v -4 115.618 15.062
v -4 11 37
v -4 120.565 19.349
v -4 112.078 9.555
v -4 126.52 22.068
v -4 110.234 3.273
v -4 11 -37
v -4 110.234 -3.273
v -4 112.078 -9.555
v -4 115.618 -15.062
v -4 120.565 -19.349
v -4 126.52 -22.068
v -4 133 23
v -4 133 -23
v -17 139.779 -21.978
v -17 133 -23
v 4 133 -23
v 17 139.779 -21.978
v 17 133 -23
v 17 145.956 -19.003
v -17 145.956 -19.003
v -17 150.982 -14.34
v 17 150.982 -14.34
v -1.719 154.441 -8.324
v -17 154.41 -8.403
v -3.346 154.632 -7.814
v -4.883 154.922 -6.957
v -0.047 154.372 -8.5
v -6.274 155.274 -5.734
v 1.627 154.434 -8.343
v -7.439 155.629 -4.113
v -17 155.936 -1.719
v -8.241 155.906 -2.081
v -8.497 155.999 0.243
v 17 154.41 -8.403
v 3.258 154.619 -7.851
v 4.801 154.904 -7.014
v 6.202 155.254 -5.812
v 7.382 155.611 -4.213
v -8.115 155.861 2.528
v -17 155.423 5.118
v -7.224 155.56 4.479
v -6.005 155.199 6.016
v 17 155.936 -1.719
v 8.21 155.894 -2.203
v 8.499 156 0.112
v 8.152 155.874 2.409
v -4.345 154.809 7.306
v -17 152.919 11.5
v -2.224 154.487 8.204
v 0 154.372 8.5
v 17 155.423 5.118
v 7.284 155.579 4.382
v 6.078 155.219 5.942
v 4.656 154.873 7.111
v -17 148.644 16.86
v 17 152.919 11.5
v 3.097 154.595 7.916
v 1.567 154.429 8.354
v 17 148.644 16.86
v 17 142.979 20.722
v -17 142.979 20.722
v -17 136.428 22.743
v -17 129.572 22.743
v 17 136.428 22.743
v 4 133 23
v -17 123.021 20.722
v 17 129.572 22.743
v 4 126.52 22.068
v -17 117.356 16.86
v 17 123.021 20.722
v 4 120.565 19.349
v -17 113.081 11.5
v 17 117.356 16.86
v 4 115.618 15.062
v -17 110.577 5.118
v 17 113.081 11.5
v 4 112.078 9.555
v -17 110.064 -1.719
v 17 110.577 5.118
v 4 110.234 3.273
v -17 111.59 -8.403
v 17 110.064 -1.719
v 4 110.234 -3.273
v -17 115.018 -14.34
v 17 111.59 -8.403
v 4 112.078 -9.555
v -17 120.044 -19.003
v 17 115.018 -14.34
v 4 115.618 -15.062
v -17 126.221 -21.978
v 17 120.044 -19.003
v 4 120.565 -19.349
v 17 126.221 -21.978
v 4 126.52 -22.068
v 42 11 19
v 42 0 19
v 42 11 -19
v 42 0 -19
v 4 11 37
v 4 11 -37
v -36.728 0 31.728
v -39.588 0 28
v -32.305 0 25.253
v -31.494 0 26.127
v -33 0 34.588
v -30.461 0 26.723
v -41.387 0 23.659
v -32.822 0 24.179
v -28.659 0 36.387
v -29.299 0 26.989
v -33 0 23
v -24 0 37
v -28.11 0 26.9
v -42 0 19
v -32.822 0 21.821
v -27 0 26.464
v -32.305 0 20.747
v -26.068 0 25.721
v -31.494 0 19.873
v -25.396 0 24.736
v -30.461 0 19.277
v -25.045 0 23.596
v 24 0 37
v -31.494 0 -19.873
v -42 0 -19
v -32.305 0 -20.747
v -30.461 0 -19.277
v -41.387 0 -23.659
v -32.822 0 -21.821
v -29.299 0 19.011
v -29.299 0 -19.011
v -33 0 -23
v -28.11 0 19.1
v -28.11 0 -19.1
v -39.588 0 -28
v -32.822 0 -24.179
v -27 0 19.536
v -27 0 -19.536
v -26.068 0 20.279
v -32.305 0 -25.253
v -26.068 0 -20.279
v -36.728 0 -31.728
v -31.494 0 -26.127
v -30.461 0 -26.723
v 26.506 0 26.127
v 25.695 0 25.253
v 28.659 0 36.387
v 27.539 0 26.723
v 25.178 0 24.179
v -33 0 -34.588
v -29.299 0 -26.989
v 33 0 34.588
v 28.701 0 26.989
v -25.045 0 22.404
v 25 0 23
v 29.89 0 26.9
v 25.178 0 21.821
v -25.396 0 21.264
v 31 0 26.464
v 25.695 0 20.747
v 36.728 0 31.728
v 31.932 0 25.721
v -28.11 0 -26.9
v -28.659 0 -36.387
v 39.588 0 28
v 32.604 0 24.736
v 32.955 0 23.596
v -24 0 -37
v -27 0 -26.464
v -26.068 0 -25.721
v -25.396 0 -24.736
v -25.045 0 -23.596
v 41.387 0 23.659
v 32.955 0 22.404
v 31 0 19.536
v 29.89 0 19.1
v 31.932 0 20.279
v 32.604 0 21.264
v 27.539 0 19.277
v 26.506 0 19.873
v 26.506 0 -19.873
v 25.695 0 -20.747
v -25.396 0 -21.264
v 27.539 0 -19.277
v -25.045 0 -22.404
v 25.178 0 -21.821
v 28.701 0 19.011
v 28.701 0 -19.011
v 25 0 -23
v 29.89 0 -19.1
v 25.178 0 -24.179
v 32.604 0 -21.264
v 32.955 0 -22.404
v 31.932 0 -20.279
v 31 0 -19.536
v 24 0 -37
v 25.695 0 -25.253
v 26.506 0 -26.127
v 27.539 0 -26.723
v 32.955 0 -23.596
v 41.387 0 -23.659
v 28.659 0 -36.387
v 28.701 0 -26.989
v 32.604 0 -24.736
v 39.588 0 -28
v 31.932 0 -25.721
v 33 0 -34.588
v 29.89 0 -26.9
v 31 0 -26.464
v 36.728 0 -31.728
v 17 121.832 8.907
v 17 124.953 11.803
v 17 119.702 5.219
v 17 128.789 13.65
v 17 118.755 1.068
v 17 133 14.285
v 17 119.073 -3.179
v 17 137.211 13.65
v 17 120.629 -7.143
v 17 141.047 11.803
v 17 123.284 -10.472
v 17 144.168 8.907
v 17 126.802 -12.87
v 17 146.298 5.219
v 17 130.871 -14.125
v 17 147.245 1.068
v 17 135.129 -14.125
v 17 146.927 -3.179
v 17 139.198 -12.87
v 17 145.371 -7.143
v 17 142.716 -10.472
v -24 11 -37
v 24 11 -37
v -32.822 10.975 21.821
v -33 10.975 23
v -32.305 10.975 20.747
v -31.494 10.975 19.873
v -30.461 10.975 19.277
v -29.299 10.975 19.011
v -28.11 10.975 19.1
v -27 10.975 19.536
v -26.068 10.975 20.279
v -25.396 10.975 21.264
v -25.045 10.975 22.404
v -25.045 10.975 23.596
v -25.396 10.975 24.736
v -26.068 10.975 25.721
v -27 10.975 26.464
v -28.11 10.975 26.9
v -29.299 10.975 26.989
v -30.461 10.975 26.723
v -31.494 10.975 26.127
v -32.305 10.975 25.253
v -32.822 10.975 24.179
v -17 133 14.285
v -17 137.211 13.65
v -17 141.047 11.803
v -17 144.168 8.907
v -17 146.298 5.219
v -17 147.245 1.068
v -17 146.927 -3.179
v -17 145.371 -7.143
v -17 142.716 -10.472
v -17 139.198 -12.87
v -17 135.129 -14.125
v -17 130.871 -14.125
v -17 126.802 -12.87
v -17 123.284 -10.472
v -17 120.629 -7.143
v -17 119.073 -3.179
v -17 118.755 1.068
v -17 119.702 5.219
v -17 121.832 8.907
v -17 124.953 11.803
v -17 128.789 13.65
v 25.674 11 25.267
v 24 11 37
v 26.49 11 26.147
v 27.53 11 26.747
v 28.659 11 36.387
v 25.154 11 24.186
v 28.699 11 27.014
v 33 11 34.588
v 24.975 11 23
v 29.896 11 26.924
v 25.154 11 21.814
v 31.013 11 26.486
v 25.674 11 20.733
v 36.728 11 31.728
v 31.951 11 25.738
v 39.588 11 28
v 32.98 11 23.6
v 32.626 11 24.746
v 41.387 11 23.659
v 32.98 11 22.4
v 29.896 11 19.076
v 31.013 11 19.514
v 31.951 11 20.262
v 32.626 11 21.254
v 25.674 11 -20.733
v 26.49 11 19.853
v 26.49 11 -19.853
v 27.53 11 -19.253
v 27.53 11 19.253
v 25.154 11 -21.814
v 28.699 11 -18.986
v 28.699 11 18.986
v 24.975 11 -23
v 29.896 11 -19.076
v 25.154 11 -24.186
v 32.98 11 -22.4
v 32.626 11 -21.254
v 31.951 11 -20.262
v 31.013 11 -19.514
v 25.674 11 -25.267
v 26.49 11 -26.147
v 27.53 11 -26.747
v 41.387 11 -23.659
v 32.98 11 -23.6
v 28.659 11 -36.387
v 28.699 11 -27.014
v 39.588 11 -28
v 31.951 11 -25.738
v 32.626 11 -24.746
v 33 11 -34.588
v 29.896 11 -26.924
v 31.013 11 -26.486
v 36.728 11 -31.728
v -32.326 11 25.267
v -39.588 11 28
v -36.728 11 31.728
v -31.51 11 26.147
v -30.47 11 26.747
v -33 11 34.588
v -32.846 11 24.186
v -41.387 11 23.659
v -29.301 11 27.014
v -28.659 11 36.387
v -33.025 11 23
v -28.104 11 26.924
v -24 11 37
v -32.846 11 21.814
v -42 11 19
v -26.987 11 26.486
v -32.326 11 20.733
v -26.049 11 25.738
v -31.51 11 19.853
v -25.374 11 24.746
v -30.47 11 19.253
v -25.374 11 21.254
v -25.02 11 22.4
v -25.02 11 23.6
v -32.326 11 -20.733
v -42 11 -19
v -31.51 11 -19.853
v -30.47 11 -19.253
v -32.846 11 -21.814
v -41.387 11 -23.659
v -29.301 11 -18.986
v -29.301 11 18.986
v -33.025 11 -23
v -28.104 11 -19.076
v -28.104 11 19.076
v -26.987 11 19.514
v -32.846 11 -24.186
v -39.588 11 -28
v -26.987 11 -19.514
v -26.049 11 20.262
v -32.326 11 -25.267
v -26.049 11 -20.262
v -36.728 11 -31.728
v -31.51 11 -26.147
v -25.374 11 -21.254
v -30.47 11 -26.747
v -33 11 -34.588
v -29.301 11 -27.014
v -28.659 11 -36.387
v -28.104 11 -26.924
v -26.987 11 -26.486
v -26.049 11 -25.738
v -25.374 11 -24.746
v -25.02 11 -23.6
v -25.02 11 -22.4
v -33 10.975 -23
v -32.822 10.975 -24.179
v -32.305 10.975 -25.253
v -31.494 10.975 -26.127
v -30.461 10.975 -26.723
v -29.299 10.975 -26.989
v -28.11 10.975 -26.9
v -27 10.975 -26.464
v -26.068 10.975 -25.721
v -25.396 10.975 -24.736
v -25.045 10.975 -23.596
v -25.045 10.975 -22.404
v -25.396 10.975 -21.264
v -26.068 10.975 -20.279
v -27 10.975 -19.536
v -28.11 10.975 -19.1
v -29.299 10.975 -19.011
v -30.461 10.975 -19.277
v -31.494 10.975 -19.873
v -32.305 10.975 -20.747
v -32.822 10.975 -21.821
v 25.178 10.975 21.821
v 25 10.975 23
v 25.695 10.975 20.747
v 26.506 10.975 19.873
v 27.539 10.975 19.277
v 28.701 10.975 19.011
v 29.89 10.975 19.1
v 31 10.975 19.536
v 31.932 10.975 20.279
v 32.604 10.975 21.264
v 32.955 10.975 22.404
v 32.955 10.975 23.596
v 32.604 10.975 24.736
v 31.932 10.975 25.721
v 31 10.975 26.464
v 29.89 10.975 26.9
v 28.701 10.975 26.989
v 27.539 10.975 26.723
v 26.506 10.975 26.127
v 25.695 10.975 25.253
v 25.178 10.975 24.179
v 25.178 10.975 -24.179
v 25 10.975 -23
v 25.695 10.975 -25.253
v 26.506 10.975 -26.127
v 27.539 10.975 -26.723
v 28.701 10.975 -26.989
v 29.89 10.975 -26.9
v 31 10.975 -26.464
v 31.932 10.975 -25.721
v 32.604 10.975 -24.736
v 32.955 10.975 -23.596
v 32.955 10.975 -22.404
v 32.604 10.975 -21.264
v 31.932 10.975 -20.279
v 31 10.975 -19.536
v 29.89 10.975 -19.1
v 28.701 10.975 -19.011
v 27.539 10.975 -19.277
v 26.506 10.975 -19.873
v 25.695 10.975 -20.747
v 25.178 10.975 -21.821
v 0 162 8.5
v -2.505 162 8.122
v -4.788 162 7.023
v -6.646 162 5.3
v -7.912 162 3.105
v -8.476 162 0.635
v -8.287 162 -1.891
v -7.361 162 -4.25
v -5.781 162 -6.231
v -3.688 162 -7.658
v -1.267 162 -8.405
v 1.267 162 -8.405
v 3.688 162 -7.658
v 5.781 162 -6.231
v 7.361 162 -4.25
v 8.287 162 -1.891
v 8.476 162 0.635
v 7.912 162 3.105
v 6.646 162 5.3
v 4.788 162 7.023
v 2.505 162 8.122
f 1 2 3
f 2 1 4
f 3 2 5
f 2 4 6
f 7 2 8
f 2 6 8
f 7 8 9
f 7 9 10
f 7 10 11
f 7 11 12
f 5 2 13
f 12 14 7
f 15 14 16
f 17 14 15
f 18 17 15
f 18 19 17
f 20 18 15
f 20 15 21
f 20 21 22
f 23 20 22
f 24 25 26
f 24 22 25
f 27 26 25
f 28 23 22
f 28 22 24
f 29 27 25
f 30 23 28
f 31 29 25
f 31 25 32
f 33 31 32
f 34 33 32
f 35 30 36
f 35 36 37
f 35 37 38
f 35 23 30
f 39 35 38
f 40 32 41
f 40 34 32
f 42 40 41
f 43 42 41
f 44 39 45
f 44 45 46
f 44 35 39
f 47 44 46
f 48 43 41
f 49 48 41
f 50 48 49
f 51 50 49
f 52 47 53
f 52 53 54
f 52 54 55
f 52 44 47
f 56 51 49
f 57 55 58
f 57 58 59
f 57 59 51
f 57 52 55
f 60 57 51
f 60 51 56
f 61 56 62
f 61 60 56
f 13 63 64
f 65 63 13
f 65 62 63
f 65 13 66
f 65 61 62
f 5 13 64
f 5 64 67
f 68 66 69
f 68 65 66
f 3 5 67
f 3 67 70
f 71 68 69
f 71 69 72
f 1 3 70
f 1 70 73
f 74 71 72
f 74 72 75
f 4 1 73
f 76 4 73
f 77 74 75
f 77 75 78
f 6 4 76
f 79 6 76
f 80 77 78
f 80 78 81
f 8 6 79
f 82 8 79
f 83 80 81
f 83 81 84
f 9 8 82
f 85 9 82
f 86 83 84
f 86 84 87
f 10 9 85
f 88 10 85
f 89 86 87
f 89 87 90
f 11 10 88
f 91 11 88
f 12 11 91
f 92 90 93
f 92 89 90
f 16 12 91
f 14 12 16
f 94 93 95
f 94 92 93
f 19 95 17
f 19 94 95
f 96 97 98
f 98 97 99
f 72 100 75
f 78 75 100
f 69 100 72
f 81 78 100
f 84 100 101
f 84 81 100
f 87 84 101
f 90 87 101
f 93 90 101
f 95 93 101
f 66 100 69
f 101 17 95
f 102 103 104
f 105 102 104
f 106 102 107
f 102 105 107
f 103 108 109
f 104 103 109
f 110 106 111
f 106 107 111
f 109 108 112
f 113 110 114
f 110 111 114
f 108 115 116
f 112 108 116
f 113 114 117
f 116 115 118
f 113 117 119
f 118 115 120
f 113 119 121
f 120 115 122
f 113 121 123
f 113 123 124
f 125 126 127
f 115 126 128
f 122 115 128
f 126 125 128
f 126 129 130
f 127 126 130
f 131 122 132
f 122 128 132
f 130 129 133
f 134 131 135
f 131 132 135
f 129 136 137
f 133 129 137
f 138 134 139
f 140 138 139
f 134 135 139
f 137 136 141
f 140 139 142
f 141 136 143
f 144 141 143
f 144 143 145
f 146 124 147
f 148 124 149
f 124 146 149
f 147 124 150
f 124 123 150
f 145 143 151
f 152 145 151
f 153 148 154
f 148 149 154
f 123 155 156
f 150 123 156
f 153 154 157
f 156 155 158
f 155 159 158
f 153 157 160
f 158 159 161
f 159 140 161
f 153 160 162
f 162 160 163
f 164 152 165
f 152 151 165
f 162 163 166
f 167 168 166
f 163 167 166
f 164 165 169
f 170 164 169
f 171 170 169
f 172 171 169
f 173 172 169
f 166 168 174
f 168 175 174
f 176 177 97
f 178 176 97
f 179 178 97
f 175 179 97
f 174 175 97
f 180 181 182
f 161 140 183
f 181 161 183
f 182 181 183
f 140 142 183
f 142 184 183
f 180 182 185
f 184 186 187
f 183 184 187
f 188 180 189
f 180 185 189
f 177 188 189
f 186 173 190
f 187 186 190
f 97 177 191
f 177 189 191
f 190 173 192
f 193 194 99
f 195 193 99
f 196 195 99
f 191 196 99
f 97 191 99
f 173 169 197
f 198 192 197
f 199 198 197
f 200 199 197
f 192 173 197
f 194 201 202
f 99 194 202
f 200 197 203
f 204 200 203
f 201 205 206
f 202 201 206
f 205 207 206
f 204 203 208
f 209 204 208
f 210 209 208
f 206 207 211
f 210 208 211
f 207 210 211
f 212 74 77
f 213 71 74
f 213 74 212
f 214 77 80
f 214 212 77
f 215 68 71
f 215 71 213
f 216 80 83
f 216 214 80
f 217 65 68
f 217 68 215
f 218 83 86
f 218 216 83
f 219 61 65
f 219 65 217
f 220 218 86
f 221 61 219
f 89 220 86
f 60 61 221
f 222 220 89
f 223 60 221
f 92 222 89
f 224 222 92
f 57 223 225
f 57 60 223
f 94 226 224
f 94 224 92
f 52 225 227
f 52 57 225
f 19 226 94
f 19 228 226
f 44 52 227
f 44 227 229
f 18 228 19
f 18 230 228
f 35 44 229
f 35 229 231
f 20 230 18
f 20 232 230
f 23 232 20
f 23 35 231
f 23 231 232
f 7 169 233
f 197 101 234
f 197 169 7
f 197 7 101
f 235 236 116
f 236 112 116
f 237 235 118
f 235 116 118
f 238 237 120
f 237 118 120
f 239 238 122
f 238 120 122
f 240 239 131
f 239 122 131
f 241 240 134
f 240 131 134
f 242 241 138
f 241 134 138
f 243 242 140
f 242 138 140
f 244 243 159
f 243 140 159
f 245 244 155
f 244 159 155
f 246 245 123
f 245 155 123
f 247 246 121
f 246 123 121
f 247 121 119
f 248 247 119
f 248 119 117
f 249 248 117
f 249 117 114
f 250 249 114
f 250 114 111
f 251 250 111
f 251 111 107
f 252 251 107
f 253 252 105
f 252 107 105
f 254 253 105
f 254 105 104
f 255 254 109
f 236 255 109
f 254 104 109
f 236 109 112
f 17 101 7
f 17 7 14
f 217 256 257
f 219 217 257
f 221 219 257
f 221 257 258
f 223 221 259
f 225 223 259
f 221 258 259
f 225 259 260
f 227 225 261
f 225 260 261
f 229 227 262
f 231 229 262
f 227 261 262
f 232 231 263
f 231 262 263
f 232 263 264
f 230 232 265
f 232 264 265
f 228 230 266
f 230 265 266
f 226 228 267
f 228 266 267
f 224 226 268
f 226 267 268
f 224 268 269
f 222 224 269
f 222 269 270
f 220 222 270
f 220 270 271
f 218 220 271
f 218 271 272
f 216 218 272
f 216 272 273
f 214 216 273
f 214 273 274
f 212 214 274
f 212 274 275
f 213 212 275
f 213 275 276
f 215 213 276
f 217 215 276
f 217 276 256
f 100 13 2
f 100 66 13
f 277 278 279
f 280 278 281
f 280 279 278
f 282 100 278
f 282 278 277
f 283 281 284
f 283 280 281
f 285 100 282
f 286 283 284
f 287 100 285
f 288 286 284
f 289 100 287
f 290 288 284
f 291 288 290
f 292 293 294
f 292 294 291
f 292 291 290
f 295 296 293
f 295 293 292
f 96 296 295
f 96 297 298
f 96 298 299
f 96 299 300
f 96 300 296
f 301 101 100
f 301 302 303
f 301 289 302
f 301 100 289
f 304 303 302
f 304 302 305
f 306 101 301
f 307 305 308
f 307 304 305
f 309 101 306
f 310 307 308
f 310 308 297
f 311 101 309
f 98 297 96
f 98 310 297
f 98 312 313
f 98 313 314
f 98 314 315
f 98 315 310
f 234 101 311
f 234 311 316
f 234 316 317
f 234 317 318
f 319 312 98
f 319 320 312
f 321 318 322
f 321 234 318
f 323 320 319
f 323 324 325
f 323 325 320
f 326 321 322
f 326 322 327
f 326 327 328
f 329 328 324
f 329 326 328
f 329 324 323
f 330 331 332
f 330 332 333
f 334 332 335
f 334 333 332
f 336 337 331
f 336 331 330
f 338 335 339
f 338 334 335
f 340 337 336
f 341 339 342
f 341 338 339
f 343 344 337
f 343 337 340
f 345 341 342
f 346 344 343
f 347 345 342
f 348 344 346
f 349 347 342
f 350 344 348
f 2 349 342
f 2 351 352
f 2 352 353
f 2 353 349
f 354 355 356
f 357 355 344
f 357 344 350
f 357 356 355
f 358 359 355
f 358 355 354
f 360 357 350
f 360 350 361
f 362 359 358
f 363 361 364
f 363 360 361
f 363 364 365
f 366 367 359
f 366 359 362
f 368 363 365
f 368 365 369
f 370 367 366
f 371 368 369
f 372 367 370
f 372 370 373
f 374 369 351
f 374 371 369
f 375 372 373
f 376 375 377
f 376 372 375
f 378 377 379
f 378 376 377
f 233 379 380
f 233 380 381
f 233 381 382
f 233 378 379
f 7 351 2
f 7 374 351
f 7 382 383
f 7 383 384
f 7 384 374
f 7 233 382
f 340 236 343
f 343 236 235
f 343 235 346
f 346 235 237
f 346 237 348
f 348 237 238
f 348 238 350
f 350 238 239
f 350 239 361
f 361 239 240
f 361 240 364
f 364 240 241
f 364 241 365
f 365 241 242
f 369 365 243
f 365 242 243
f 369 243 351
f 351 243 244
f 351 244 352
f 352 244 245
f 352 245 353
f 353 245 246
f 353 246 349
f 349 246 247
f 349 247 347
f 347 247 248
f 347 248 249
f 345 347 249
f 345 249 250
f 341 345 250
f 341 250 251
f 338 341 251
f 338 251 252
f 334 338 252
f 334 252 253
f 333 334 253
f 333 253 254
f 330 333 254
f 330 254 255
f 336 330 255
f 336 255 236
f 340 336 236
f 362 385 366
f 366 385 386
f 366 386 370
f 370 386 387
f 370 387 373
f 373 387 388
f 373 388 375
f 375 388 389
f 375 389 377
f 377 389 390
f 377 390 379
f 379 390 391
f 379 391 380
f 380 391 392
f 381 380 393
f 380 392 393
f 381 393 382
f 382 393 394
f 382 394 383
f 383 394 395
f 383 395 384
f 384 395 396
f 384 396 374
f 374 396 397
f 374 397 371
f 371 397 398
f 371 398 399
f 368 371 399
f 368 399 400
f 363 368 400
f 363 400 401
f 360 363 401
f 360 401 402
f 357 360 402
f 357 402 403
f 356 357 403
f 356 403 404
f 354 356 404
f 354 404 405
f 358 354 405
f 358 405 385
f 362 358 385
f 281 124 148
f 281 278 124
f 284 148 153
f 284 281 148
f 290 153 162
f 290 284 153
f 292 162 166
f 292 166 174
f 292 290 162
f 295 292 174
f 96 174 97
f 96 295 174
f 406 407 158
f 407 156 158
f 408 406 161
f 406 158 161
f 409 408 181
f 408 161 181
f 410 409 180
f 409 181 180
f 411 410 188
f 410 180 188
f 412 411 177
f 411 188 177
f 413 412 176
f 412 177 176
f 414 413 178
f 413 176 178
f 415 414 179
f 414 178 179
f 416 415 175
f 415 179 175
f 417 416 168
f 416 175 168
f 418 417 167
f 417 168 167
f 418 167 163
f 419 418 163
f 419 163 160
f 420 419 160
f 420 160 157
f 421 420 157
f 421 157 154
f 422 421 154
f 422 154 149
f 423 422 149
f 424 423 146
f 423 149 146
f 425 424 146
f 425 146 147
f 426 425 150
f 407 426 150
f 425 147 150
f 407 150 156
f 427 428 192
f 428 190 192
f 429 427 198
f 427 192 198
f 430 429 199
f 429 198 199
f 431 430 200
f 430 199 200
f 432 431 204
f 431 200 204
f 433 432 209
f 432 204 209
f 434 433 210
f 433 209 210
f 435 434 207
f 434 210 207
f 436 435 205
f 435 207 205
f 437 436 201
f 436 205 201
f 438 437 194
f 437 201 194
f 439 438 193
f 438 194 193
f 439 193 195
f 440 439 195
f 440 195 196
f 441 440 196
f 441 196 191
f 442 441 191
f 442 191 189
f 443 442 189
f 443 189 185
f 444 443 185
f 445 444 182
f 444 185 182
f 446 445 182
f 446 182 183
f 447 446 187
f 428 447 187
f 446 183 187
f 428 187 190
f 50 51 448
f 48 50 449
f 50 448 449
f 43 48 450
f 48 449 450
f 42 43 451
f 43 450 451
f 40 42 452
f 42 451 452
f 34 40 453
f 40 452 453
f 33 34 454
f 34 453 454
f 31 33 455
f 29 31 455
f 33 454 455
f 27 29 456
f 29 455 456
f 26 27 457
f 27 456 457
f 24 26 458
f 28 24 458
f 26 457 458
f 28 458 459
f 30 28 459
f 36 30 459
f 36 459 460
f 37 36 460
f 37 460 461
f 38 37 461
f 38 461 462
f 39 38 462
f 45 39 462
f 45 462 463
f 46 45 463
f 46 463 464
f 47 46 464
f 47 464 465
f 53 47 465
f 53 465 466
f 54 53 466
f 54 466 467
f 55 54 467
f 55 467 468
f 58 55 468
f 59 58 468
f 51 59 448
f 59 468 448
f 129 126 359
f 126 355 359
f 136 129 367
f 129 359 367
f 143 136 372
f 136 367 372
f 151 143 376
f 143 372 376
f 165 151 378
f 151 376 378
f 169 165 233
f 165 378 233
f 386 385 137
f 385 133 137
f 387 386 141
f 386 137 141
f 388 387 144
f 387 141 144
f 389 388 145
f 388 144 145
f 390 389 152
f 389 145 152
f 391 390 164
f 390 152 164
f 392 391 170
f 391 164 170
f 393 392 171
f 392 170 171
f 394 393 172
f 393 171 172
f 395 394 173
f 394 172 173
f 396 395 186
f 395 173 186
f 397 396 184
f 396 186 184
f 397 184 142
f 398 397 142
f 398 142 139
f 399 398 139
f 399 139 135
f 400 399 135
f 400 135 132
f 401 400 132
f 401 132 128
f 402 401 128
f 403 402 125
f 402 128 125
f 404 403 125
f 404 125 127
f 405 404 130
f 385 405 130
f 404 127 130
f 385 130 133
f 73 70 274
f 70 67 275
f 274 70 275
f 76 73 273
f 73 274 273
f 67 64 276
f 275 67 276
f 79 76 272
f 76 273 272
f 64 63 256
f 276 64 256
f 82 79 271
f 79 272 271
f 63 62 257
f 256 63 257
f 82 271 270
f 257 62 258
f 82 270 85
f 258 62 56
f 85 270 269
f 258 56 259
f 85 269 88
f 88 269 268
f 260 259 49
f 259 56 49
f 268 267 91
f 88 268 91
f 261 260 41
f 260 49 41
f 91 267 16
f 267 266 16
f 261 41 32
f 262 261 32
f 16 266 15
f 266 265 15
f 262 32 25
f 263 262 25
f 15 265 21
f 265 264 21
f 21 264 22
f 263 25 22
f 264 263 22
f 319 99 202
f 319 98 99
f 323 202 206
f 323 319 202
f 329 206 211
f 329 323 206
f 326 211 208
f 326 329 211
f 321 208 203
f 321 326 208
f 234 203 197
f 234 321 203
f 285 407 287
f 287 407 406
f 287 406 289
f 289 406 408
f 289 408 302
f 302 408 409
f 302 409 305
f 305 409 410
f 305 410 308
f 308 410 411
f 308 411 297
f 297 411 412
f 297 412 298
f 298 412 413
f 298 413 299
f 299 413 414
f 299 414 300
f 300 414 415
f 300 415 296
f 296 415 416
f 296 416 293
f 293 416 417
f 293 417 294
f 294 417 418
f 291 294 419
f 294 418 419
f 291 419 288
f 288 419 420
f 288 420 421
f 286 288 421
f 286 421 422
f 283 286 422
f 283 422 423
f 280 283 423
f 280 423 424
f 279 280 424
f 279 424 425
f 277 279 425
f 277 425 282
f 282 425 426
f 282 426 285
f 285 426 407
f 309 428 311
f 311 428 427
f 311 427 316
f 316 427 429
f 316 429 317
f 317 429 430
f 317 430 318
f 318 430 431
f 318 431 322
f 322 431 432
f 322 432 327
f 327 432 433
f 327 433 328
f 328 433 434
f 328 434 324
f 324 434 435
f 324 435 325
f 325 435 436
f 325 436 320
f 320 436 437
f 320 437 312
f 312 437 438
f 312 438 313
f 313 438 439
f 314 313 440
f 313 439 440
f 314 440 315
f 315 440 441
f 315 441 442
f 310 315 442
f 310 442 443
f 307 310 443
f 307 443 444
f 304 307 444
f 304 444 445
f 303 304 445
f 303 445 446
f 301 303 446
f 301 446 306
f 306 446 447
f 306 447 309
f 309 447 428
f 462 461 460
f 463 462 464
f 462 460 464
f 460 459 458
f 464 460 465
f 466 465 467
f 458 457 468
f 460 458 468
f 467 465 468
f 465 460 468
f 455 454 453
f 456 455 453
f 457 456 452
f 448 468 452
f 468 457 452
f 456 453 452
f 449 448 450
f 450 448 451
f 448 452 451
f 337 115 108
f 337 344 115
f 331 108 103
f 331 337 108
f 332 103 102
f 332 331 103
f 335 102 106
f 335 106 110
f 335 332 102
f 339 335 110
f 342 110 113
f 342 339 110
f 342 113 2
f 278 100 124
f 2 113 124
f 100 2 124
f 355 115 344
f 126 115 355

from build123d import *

# Parameters (mm, degrees)
SKETCH2_W                          = 84
SKETCH2_H                          = 74
BOSS_EXTRUDE1_DEPTH                = 11
FILLET1_R                          = 18
F_8_0_8_DIAMETER_HOLE1_D           = 8
F_8_0_8_DIAMETER_HOLE1_CSINK_D     = 8.05
F_8_0_8_DIAMETER_HOLE1_CSINK_ANGLE = 90
BOSS_EXTRUDE6_DEPTH                = 4
SKETCH9_9_R                        = 23
BOSS_EXTRUDE7_DEPTH                = 17
F_8_0_28_57_DIAMETER_HOLE1_D       = 28.57
BOSS_EXTRUDE8_REACH                = 173.397
BOSS_EXTRUDE8_END_RADIUS           = 23
SKETCH18_R                         = 8.5


with BuildPart() as part:
    # Sketch2 → Boss-Extrude1 (new body)
    with BuildSketch(Plane(origin=(0, 0, 0), x_dir=(1, 0, 0), z_dir=(0, 1, 0))):
        Rectangle(SKETCH2_W, SKETCH2_H)
    extrude(amount=BOSS_EXTRUDE1_DEPTH)

    # Fillet1
    fillet1_edges = [part.edges().sort_by_distance(p)[0] for p in [
        (-42, 5.5, 37),
        (-42, 5.5, -37),
        (42, 5.5, -37),
        (42, 5.5, 37),
    ]]
    fillet(fillet1_edges, radius=FILLET1_R)

    # Ø8.0 (8) Diameter Hole1 (through all)
    with Locations(Plane(origin=(0, 11, 0), x_dir=(1, 0, 0), z_dir=(0, 1, 0))):
        with Locations((-29, 23), (29, 23), (29, -23), (-29, -23)):
            CounterSinkHole(F_8_0_8_DIAMETER_HOLE1_D / 2, F_8_0_8_DIAMETER_HOLE1_CSINK_D / 2, counter_sink_angle=F_8_0_8_DIAMETER_HOLE1_CSINK_ANGLE)

    # Sketch9 → Boss-Extrude6 (add, symmetric)
    with BuildSketch(Plane(origin=(0, 0, 0), x_dir=(0, 0, -1), z_dir=(1, 0, 0))):
        with BuildLine():
            Line((-23, 133), (-37, 11))
            Line((-37, 11), (37, 11))
            Line((37, 11), (23, 133))
            ThreePointArc((23, 133), (0, 110), (-23, 133))
        make_face()
    extrude(amount=BOSS_EXTRUDE6_DEPTH, both=True)

    # Sketch9<9> → Boss-Extrude7 (add, symmetric)
    with BuildSketch(Plane(origin=(0, 0, 0), x_dir=(0, 0, -1), z_dir=(1, 0, 0))):
        with Locations((0, 133)):
            Circle(SKETCH9_9_R)
    extrude(amount=BOSS_EXTRUDE7_DEPTH, both=True)

    # Ø8.0 (28.57) Diameter Hole1 (through all)
    with Locations(Plane(origin=(17, 0, 0), x_dir=(0, 0, -1), z_dir=(1, 0, 0))):
        with Locations((0, 133)):
            Hole(F_8_0_28_57_DIAMETER_HOLE1_D / 2)

    # Boss-Extrude8: up to this cylinder (the profile starts outside it)
    boss_extrude8_end = Plane(origin=(0, 133, 0), z_dir=(-1, 0, 0)) * Cylinder(BOSS_EXTRUDE8_END_RADIUS, 393.794, mode=Mode.PRIVATE)
    # Sketch18 → Boss-Extrude8 (add, up to the surface)
    with BuildSketch(Plane(origin=(0, 162, 0), x_dir=(-1, 0, 0), z_dir=(0, -1, 0)), mode=Mode.PRIVATE) as boss_extrude8_sk1:
        with Locations(Location((0, 0, 0), (0, 0, 270))):
            Circle(SKETCH18_R)
    boss_extrude8_tool1 = extrude(boss_extrude8_sk1.sketch, amount=BOSS_EXTRUDE8_REACH, mode=Mode.PRIVATE) - boss_extrude8_end
    add(boss_extrude8_tool1.solids().sort_by_distance((0, 162, 0))[0])


solid = part.part
